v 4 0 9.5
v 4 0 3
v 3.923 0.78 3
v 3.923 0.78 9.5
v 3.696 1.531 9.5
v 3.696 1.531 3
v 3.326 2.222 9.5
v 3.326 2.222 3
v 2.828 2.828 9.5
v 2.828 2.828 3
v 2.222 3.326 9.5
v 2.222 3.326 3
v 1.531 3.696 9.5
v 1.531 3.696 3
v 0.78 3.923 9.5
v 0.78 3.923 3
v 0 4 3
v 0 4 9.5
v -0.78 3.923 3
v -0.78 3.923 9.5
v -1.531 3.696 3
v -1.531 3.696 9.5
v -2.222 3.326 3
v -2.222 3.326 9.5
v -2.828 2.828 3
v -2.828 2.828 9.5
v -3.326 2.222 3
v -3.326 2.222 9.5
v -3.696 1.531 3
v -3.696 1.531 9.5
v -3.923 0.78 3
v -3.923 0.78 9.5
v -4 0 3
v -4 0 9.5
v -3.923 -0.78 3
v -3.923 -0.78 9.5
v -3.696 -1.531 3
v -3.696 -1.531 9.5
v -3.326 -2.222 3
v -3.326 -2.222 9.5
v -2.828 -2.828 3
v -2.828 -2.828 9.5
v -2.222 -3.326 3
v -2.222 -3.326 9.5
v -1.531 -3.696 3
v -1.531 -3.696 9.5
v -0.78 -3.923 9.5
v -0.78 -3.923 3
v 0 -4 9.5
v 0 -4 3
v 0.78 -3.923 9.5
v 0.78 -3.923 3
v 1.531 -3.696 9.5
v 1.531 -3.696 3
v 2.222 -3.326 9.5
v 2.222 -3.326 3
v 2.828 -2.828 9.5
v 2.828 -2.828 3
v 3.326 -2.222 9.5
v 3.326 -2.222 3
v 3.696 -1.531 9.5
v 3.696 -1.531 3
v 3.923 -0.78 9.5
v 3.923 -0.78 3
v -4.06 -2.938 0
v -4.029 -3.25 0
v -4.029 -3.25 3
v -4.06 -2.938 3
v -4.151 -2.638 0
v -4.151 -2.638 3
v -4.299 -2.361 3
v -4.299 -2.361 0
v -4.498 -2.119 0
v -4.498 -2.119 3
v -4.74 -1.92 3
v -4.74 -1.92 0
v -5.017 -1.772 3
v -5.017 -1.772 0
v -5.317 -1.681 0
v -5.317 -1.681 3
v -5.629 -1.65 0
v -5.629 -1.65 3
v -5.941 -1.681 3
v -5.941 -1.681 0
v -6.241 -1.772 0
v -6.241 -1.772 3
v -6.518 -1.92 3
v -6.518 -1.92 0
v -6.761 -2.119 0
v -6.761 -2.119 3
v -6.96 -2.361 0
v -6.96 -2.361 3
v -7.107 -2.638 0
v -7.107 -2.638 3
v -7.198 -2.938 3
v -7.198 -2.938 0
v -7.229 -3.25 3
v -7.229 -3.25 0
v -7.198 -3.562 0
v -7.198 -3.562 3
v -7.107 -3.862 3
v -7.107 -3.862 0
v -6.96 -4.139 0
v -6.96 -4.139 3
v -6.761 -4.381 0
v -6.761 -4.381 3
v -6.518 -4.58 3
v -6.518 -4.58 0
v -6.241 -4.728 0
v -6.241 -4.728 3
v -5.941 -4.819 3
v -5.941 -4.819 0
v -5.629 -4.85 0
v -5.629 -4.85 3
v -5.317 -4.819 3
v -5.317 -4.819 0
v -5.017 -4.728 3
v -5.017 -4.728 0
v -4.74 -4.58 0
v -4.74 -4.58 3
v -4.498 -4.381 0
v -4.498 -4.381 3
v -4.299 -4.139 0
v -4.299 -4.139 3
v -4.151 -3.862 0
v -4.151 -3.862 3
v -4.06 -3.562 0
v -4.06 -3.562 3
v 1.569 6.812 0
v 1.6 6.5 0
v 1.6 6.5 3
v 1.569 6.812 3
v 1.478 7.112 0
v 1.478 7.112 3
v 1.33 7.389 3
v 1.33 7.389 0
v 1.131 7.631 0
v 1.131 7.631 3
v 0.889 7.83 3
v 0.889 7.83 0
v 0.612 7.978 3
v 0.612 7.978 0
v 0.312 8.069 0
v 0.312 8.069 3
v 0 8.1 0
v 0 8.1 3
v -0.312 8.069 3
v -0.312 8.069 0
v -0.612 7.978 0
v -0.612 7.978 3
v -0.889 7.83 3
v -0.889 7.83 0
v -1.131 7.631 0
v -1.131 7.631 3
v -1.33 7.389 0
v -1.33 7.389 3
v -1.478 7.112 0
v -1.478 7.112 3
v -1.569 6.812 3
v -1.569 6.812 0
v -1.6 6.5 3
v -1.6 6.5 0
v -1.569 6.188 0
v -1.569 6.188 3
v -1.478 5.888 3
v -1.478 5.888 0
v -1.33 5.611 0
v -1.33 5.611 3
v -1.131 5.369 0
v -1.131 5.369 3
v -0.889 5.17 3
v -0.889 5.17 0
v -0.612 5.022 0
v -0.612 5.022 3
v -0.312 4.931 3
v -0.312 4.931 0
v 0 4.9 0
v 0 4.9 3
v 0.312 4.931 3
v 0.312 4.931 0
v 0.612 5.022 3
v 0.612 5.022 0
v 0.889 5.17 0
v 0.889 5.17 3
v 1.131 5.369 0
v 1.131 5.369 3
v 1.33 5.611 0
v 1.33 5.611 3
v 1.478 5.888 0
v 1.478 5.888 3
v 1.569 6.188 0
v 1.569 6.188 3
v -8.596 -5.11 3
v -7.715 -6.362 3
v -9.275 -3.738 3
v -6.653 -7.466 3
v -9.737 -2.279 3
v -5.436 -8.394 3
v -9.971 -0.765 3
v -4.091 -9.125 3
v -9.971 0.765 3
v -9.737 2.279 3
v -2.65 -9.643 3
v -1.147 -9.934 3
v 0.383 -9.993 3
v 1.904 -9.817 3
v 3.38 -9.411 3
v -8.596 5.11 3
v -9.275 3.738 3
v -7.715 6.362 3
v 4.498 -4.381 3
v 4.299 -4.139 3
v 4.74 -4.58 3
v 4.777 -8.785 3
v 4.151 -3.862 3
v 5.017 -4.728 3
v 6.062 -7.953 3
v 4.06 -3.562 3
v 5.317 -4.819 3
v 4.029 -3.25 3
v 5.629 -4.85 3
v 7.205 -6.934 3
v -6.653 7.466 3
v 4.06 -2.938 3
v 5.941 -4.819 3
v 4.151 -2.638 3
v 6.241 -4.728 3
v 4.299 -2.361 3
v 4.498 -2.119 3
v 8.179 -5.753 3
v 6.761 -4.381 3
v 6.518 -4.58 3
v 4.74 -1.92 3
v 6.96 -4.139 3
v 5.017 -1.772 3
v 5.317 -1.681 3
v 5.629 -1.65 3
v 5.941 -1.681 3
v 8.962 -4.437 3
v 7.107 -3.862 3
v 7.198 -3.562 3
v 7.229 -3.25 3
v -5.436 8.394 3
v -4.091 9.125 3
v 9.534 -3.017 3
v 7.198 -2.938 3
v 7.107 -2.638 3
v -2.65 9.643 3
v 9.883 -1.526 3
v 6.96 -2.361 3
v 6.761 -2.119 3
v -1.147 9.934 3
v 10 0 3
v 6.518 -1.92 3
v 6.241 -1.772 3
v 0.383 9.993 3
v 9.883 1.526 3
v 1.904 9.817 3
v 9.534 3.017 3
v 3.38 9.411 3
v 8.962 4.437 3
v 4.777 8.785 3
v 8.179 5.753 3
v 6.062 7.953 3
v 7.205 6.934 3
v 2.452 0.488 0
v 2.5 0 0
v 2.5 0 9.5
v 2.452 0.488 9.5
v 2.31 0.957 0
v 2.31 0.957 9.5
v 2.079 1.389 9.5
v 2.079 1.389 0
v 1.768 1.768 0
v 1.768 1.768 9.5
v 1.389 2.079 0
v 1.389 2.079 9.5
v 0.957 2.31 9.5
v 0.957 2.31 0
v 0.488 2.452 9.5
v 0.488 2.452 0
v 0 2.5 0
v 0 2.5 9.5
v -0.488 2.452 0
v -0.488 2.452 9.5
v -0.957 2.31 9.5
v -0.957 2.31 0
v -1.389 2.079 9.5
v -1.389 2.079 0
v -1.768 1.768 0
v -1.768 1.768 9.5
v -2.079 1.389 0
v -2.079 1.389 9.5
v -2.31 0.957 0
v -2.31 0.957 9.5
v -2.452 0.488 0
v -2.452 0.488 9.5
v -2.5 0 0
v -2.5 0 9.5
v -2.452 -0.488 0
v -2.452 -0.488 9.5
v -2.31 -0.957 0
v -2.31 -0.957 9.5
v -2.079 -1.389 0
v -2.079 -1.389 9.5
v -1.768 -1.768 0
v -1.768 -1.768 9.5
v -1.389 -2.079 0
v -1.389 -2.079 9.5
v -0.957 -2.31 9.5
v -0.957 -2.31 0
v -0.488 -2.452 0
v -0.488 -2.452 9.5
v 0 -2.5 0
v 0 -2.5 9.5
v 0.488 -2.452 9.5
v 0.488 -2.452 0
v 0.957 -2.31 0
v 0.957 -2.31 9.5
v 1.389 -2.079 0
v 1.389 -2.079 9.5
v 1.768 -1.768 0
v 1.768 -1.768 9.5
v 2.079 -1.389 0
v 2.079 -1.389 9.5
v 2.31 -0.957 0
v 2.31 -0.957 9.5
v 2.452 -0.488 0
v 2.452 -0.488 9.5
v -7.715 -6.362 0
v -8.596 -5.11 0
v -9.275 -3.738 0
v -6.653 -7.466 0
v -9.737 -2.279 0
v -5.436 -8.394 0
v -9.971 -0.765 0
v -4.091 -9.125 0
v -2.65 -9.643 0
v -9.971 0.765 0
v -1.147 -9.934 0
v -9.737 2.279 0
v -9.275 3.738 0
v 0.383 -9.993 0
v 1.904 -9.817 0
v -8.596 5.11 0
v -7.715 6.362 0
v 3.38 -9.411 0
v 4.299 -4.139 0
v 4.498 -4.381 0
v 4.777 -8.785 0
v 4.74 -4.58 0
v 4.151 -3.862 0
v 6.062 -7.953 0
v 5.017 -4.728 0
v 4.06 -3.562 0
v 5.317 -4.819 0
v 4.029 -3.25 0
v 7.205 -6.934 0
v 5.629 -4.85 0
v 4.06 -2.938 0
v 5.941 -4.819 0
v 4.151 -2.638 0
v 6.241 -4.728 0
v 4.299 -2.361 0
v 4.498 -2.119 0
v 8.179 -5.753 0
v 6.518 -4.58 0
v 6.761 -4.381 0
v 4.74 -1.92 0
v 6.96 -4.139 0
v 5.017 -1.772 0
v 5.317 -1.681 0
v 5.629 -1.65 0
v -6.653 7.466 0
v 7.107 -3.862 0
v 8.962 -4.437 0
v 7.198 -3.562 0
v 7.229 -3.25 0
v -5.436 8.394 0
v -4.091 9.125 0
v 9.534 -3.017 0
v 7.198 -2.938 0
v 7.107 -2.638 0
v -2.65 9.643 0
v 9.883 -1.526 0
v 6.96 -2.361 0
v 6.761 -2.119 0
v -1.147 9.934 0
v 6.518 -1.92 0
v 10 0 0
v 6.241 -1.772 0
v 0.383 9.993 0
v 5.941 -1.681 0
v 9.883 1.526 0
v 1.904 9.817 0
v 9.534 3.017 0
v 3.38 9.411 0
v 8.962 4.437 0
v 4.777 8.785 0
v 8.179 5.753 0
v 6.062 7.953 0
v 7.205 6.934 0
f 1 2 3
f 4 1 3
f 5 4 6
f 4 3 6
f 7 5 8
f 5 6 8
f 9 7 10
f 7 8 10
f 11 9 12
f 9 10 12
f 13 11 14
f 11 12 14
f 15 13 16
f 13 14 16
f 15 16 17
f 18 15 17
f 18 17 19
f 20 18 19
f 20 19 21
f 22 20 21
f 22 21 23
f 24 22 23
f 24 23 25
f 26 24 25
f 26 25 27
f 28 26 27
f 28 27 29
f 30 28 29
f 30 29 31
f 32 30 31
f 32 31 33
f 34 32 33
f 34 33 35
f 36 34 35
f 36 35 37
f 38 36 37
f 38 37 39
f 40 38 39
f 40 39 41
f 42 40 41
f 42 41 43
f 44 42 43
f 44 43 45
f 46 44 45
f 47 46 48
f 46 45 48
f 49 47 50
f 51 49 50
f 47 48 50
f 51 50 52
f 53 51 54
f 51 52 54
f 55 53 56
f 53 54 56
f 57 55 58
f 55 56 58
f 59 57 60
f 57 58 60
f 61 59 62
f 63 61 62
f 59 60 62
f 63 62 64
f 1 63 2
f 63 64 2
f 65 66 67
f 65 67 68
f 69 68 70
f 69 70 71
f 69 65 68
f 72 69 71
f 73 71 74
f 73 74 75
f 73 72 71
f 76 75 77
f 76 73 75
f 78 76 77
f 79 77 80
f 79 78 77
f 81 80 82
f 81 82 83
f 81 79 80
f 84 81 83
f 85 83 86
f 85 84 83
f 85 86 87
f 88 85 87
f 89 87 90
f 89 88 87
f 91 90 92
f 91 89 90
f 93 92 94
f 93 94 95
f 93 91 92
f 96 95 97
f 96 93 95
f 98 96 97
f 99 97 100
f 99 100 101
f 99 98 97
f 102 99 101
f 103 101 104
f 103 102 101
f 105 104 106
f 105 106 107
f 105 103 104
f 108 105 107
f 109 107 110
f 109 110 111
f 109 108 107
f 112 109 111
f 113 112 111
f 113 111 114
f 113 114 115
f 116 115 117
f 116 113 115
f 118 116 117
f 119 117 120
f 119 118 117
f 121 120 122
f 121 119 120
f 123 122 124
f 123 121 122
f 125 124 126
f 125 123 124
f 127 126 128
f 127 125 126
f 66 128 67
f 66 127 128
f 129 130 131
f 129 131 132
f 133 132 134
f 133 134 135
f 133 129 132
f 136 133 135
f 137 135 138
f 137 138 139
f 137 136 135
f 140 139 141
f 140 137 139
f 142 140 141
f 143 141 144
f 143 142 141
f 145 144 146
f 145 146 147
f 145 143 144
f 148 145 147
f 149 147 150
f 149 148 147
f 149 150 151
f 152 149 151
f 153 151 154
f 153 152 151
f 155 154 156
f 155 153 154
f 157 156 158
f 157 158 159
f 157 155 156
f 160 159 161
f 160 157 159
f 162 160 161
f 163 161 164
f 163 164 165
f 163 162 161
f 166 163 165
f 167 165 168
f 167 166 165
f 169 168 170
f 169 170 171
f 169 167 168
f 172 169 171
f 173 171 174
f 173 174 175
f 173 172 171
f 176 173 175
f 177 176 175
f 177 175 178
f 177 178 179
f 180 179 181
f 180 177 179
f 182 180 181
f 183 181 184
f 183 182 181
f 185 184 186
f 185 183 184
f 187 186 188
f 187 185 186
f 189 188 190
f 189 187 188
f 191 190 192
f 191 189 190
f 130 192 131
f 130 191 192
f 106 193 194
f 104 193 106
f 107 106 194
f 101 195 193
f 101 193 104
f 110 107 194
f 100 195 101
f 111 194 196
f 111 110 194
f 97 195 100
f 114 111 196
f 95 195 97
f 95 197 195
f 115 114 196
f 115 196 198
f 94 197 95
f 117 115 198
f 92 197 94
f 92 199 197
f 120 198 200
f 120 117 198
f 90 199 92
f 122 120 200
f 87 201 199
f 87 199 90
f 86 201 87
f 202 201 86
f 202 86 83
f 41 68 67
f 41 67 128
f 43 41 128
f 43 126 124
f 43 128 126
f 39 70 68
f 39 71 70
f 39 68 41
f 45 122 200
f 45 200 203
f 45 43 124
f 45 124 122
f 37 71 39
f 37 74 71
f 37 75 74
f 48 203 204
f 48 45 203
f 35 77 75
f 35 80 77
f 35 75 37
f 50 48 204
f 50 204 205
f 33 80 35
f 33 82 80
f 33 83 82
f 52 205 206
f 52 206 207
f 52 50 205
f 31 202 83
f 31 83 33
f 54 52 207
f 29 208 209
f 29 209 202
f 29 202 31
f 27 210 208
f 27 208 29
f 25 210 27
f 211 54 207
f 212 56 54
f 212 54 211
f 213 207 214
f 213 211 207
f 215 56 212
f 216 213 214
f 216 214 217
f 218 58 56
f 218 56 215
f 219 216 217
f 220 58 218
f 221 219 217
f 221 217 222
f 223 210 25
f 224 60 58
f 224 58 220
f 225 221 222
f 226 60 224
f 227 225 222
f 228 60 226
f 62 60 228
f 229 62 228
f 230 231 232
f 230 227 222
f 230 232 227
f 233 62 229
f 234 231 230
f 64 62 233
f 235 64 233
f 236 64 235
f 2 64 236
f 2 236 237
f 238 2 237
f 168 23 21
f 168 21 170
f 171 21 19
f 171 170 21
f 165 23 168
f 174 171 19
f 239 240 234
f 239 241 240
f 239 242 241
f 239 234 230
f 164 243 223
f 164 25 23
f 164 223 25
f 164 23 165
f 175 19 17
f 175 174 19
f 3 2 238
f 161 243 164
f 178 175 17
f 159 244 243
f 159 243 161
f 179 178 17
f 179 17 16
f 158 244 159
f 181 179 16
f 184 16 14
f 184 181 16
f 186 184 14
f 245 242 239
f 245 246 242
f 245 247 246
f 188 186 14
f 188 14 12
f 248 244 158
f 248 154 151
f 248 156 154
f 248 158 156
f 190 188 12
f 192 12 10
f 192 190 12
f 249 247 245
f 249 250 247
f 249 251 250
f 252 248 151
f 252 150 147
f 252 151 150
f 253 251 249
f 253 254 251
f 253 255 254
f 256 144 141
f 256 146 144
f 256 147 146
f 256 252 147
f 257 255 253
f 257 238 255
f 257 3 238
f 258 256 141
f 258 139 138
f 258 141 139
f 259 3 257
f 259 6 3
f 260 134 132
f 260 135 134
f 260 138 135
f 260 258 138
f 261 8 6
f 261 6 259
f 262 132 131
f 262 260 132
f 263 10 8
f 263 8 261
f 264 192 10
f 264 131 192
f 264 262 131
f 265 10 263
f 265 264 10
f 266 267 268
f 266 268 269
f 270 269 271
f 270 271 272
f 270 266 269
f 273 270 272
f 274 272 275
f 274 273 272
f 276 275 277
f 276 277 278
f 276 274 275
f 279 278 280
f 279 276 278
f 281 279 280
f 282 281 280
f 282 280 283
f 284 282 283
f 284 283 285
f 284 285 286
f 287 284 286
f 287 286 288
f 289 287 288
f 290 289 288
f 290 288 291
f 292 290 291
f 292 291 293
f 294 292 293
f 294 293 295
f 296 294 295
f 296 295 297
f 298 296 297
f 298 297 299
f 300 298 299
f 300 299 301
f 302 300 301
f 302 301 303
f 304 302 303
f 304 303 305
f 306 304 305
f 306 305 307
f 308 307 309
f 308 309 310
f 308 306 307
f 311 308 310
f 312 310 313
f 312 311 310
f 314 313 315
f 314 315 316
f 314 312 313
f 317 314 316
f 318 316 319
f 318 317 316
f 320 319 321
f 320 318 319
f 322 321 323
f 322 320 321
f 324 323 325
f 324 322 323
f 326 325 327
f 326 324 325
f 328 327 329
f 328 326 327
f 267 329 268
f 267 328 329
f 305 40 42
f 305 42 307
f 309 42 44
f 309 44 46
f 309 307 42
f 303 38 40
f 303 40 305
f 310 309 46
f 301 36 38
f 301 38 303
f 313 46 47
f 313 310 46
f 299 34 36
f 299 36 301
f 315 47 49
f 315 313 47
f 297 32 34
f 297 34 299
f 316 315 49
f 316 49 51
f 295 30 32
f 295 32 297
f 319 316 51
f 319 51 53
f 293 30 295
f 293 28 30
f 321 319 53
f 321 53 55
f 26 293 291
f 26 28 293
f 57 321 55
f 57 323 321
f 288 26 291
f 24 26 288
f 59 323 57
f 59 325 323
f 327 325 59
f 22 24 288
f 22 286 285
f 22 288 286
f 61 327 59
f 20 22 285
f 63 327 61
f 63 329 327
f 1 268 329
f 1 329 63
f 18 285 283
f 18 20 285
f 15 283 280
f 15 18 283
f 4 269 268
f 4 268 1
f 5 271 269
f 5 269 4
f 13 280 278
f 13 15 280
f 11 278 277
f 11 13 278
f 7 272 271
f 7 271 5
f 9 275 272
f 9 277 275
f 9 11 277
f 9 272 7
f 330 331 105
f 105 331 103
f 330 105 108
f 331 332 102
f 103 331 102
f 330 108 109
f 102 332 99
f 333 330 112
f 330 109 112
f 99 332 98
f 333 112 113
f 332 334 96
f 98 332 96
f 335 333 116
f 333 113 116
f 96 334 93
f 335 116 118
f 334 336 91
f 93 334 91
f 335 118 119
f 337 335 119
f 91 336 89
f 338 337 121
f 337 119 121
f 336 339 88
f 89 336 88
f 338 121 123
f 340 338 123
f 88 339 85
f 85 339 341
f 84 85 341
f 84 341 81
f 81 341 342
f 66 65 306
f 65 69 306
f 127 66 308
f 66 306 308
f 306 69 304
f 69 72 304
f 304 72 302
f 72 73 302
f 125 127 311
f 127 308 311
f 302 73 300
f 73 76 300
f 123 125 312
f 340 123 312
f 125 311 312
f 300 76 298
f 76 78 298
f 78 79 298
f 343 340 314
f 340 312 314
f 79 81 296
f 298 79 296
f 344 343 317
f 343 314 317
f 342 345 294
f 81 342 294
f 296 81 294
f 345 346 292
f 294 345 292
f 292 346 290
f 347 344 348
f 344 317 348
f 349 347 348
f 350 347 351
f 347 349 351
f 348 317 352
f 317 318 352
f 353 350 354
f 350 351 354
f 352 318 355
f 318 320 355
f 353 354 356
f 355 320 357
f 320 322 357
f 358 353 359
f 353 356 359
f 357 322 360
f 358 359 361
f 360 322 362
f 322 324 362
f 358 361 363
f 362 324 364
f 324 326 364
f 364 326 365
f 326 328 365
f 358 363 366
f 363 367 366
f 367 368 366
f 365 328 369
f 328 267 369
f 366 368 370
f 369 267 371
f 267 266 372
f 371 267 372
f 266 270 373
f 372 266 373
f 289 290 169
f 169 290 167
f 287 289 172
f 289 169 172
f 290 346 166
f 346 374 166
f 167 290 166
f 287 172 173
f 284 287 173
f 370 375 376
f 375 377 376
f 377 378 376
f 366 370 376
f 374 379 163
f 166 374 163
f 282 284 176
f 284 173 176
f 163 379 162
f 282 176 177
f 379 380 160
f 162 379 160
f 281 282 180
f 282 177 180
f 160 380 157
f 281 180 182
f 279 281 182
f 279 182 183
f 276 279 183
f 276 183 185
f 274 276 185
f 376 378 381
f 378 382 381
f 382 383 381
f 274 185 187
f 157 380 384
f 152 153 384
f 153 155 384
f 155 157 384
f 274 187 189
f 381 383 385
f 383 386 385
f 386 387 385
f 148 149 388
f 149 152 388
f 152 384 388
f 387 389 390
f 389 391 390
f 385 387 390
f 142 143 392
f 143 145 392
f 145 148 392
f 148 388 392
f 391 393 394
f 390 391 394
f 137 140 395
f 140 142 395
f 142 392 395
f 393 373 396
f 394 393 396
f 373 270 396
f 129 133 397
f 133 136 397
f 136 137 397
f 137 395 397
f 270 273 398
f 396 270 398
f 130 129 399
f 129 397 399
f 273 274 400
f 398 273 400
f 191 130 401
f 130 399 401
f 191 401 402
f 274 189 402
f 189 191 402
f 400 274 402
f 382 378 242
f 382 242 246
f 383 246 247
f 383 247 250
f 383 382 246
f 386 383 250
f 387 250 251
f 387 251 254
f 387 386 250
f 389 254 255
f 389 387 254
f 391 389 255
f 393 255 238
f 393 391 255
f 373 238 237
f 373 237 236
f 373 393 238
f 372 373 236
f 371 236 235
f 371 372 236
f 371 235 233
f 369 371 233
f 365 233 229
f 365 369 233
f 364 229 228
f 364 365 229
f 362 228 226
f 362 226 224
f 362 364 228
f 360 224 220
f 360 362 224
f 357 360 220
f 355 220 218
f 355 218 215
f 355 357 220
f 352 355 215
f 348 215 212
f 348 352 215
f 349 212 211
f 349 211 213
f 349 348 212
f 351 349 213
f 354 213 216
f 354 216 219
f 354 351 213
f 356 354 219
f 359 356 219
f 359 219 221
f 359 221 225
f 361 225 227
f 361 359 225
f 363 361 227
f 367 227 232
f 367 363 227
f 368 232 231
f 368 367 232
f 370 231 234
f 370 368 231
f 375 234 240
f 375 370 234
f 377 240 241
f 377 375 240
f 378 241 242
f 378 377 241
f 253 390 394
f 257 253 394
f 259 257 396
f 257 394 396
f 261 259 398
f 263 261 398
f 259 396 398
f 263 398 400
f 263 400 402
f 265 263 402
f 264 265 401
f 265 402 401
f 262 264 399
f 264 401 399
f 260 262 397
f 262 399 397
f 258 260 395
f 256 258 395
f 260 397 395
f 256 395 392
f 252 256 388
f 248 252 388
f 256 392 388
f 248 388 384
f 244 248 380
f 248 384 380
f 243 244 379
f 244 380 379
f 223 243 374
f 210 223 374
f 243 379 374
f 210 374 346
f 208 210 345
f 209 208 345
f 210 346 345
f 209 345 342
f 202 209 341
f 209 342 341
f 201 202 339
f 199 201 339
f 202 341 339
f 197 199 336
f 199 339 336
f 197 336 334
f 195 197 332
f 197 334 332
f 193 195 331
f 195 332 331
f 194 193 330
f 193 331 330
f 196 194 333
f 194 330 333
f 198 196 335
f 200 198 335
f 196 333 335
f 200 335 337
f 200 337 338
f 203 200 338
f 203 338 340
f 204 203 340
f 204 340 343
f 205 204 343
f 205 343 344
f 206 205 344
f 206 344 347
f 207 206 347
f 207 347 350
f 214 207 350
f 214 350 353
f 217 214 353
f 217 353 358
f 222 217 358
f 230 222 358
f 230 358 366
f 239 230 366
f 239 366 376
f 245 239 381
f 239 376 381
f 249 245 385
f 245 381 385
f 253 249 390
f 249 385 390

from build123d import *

# Parameters (mm, degrees)
F2_R     = 10
F2_R_2   = 1.6
F2_R_3   = 4
F2_R_4   = 2.5
F3_DEPTH = 3
F4_DEPTH = 9.5


with BuildPart() as f3:
    # F2 (on Top) → F3 (new body)
    with BuildSketch(Plane.XY):
        Circle(F2_R)
        with Locations((-5.6291651246, -3.25)):
            Circle(F2_R_2, mode=Mode.SUBTRACT)
        with Locations((5.6291651246, -3.25)):
            Circle(F2_R_2, mode=Mode.SUBTRACT)
        Circle(F2_R_3, mode=Mode.SUBTRACT)
        with Locations((0, 6.5)):
            Circle(F2_R_2, mode=Mode.SUBTRACT)
        Circle(F2_R_3)
        Circle(F2_R_4, mode=Mode.SUBTRACT)
    extrude(amount=F3_DEPTH)

    # F2 (on Top) → F4 (join)
    with BuildSketch(Plane.XY):
        Circle(F2_R_3)
        Circle(F2_R_4, mode=Mode.SUBTRACT)
    extrude(amount=F4_DEPTH)


solid = f3.part
